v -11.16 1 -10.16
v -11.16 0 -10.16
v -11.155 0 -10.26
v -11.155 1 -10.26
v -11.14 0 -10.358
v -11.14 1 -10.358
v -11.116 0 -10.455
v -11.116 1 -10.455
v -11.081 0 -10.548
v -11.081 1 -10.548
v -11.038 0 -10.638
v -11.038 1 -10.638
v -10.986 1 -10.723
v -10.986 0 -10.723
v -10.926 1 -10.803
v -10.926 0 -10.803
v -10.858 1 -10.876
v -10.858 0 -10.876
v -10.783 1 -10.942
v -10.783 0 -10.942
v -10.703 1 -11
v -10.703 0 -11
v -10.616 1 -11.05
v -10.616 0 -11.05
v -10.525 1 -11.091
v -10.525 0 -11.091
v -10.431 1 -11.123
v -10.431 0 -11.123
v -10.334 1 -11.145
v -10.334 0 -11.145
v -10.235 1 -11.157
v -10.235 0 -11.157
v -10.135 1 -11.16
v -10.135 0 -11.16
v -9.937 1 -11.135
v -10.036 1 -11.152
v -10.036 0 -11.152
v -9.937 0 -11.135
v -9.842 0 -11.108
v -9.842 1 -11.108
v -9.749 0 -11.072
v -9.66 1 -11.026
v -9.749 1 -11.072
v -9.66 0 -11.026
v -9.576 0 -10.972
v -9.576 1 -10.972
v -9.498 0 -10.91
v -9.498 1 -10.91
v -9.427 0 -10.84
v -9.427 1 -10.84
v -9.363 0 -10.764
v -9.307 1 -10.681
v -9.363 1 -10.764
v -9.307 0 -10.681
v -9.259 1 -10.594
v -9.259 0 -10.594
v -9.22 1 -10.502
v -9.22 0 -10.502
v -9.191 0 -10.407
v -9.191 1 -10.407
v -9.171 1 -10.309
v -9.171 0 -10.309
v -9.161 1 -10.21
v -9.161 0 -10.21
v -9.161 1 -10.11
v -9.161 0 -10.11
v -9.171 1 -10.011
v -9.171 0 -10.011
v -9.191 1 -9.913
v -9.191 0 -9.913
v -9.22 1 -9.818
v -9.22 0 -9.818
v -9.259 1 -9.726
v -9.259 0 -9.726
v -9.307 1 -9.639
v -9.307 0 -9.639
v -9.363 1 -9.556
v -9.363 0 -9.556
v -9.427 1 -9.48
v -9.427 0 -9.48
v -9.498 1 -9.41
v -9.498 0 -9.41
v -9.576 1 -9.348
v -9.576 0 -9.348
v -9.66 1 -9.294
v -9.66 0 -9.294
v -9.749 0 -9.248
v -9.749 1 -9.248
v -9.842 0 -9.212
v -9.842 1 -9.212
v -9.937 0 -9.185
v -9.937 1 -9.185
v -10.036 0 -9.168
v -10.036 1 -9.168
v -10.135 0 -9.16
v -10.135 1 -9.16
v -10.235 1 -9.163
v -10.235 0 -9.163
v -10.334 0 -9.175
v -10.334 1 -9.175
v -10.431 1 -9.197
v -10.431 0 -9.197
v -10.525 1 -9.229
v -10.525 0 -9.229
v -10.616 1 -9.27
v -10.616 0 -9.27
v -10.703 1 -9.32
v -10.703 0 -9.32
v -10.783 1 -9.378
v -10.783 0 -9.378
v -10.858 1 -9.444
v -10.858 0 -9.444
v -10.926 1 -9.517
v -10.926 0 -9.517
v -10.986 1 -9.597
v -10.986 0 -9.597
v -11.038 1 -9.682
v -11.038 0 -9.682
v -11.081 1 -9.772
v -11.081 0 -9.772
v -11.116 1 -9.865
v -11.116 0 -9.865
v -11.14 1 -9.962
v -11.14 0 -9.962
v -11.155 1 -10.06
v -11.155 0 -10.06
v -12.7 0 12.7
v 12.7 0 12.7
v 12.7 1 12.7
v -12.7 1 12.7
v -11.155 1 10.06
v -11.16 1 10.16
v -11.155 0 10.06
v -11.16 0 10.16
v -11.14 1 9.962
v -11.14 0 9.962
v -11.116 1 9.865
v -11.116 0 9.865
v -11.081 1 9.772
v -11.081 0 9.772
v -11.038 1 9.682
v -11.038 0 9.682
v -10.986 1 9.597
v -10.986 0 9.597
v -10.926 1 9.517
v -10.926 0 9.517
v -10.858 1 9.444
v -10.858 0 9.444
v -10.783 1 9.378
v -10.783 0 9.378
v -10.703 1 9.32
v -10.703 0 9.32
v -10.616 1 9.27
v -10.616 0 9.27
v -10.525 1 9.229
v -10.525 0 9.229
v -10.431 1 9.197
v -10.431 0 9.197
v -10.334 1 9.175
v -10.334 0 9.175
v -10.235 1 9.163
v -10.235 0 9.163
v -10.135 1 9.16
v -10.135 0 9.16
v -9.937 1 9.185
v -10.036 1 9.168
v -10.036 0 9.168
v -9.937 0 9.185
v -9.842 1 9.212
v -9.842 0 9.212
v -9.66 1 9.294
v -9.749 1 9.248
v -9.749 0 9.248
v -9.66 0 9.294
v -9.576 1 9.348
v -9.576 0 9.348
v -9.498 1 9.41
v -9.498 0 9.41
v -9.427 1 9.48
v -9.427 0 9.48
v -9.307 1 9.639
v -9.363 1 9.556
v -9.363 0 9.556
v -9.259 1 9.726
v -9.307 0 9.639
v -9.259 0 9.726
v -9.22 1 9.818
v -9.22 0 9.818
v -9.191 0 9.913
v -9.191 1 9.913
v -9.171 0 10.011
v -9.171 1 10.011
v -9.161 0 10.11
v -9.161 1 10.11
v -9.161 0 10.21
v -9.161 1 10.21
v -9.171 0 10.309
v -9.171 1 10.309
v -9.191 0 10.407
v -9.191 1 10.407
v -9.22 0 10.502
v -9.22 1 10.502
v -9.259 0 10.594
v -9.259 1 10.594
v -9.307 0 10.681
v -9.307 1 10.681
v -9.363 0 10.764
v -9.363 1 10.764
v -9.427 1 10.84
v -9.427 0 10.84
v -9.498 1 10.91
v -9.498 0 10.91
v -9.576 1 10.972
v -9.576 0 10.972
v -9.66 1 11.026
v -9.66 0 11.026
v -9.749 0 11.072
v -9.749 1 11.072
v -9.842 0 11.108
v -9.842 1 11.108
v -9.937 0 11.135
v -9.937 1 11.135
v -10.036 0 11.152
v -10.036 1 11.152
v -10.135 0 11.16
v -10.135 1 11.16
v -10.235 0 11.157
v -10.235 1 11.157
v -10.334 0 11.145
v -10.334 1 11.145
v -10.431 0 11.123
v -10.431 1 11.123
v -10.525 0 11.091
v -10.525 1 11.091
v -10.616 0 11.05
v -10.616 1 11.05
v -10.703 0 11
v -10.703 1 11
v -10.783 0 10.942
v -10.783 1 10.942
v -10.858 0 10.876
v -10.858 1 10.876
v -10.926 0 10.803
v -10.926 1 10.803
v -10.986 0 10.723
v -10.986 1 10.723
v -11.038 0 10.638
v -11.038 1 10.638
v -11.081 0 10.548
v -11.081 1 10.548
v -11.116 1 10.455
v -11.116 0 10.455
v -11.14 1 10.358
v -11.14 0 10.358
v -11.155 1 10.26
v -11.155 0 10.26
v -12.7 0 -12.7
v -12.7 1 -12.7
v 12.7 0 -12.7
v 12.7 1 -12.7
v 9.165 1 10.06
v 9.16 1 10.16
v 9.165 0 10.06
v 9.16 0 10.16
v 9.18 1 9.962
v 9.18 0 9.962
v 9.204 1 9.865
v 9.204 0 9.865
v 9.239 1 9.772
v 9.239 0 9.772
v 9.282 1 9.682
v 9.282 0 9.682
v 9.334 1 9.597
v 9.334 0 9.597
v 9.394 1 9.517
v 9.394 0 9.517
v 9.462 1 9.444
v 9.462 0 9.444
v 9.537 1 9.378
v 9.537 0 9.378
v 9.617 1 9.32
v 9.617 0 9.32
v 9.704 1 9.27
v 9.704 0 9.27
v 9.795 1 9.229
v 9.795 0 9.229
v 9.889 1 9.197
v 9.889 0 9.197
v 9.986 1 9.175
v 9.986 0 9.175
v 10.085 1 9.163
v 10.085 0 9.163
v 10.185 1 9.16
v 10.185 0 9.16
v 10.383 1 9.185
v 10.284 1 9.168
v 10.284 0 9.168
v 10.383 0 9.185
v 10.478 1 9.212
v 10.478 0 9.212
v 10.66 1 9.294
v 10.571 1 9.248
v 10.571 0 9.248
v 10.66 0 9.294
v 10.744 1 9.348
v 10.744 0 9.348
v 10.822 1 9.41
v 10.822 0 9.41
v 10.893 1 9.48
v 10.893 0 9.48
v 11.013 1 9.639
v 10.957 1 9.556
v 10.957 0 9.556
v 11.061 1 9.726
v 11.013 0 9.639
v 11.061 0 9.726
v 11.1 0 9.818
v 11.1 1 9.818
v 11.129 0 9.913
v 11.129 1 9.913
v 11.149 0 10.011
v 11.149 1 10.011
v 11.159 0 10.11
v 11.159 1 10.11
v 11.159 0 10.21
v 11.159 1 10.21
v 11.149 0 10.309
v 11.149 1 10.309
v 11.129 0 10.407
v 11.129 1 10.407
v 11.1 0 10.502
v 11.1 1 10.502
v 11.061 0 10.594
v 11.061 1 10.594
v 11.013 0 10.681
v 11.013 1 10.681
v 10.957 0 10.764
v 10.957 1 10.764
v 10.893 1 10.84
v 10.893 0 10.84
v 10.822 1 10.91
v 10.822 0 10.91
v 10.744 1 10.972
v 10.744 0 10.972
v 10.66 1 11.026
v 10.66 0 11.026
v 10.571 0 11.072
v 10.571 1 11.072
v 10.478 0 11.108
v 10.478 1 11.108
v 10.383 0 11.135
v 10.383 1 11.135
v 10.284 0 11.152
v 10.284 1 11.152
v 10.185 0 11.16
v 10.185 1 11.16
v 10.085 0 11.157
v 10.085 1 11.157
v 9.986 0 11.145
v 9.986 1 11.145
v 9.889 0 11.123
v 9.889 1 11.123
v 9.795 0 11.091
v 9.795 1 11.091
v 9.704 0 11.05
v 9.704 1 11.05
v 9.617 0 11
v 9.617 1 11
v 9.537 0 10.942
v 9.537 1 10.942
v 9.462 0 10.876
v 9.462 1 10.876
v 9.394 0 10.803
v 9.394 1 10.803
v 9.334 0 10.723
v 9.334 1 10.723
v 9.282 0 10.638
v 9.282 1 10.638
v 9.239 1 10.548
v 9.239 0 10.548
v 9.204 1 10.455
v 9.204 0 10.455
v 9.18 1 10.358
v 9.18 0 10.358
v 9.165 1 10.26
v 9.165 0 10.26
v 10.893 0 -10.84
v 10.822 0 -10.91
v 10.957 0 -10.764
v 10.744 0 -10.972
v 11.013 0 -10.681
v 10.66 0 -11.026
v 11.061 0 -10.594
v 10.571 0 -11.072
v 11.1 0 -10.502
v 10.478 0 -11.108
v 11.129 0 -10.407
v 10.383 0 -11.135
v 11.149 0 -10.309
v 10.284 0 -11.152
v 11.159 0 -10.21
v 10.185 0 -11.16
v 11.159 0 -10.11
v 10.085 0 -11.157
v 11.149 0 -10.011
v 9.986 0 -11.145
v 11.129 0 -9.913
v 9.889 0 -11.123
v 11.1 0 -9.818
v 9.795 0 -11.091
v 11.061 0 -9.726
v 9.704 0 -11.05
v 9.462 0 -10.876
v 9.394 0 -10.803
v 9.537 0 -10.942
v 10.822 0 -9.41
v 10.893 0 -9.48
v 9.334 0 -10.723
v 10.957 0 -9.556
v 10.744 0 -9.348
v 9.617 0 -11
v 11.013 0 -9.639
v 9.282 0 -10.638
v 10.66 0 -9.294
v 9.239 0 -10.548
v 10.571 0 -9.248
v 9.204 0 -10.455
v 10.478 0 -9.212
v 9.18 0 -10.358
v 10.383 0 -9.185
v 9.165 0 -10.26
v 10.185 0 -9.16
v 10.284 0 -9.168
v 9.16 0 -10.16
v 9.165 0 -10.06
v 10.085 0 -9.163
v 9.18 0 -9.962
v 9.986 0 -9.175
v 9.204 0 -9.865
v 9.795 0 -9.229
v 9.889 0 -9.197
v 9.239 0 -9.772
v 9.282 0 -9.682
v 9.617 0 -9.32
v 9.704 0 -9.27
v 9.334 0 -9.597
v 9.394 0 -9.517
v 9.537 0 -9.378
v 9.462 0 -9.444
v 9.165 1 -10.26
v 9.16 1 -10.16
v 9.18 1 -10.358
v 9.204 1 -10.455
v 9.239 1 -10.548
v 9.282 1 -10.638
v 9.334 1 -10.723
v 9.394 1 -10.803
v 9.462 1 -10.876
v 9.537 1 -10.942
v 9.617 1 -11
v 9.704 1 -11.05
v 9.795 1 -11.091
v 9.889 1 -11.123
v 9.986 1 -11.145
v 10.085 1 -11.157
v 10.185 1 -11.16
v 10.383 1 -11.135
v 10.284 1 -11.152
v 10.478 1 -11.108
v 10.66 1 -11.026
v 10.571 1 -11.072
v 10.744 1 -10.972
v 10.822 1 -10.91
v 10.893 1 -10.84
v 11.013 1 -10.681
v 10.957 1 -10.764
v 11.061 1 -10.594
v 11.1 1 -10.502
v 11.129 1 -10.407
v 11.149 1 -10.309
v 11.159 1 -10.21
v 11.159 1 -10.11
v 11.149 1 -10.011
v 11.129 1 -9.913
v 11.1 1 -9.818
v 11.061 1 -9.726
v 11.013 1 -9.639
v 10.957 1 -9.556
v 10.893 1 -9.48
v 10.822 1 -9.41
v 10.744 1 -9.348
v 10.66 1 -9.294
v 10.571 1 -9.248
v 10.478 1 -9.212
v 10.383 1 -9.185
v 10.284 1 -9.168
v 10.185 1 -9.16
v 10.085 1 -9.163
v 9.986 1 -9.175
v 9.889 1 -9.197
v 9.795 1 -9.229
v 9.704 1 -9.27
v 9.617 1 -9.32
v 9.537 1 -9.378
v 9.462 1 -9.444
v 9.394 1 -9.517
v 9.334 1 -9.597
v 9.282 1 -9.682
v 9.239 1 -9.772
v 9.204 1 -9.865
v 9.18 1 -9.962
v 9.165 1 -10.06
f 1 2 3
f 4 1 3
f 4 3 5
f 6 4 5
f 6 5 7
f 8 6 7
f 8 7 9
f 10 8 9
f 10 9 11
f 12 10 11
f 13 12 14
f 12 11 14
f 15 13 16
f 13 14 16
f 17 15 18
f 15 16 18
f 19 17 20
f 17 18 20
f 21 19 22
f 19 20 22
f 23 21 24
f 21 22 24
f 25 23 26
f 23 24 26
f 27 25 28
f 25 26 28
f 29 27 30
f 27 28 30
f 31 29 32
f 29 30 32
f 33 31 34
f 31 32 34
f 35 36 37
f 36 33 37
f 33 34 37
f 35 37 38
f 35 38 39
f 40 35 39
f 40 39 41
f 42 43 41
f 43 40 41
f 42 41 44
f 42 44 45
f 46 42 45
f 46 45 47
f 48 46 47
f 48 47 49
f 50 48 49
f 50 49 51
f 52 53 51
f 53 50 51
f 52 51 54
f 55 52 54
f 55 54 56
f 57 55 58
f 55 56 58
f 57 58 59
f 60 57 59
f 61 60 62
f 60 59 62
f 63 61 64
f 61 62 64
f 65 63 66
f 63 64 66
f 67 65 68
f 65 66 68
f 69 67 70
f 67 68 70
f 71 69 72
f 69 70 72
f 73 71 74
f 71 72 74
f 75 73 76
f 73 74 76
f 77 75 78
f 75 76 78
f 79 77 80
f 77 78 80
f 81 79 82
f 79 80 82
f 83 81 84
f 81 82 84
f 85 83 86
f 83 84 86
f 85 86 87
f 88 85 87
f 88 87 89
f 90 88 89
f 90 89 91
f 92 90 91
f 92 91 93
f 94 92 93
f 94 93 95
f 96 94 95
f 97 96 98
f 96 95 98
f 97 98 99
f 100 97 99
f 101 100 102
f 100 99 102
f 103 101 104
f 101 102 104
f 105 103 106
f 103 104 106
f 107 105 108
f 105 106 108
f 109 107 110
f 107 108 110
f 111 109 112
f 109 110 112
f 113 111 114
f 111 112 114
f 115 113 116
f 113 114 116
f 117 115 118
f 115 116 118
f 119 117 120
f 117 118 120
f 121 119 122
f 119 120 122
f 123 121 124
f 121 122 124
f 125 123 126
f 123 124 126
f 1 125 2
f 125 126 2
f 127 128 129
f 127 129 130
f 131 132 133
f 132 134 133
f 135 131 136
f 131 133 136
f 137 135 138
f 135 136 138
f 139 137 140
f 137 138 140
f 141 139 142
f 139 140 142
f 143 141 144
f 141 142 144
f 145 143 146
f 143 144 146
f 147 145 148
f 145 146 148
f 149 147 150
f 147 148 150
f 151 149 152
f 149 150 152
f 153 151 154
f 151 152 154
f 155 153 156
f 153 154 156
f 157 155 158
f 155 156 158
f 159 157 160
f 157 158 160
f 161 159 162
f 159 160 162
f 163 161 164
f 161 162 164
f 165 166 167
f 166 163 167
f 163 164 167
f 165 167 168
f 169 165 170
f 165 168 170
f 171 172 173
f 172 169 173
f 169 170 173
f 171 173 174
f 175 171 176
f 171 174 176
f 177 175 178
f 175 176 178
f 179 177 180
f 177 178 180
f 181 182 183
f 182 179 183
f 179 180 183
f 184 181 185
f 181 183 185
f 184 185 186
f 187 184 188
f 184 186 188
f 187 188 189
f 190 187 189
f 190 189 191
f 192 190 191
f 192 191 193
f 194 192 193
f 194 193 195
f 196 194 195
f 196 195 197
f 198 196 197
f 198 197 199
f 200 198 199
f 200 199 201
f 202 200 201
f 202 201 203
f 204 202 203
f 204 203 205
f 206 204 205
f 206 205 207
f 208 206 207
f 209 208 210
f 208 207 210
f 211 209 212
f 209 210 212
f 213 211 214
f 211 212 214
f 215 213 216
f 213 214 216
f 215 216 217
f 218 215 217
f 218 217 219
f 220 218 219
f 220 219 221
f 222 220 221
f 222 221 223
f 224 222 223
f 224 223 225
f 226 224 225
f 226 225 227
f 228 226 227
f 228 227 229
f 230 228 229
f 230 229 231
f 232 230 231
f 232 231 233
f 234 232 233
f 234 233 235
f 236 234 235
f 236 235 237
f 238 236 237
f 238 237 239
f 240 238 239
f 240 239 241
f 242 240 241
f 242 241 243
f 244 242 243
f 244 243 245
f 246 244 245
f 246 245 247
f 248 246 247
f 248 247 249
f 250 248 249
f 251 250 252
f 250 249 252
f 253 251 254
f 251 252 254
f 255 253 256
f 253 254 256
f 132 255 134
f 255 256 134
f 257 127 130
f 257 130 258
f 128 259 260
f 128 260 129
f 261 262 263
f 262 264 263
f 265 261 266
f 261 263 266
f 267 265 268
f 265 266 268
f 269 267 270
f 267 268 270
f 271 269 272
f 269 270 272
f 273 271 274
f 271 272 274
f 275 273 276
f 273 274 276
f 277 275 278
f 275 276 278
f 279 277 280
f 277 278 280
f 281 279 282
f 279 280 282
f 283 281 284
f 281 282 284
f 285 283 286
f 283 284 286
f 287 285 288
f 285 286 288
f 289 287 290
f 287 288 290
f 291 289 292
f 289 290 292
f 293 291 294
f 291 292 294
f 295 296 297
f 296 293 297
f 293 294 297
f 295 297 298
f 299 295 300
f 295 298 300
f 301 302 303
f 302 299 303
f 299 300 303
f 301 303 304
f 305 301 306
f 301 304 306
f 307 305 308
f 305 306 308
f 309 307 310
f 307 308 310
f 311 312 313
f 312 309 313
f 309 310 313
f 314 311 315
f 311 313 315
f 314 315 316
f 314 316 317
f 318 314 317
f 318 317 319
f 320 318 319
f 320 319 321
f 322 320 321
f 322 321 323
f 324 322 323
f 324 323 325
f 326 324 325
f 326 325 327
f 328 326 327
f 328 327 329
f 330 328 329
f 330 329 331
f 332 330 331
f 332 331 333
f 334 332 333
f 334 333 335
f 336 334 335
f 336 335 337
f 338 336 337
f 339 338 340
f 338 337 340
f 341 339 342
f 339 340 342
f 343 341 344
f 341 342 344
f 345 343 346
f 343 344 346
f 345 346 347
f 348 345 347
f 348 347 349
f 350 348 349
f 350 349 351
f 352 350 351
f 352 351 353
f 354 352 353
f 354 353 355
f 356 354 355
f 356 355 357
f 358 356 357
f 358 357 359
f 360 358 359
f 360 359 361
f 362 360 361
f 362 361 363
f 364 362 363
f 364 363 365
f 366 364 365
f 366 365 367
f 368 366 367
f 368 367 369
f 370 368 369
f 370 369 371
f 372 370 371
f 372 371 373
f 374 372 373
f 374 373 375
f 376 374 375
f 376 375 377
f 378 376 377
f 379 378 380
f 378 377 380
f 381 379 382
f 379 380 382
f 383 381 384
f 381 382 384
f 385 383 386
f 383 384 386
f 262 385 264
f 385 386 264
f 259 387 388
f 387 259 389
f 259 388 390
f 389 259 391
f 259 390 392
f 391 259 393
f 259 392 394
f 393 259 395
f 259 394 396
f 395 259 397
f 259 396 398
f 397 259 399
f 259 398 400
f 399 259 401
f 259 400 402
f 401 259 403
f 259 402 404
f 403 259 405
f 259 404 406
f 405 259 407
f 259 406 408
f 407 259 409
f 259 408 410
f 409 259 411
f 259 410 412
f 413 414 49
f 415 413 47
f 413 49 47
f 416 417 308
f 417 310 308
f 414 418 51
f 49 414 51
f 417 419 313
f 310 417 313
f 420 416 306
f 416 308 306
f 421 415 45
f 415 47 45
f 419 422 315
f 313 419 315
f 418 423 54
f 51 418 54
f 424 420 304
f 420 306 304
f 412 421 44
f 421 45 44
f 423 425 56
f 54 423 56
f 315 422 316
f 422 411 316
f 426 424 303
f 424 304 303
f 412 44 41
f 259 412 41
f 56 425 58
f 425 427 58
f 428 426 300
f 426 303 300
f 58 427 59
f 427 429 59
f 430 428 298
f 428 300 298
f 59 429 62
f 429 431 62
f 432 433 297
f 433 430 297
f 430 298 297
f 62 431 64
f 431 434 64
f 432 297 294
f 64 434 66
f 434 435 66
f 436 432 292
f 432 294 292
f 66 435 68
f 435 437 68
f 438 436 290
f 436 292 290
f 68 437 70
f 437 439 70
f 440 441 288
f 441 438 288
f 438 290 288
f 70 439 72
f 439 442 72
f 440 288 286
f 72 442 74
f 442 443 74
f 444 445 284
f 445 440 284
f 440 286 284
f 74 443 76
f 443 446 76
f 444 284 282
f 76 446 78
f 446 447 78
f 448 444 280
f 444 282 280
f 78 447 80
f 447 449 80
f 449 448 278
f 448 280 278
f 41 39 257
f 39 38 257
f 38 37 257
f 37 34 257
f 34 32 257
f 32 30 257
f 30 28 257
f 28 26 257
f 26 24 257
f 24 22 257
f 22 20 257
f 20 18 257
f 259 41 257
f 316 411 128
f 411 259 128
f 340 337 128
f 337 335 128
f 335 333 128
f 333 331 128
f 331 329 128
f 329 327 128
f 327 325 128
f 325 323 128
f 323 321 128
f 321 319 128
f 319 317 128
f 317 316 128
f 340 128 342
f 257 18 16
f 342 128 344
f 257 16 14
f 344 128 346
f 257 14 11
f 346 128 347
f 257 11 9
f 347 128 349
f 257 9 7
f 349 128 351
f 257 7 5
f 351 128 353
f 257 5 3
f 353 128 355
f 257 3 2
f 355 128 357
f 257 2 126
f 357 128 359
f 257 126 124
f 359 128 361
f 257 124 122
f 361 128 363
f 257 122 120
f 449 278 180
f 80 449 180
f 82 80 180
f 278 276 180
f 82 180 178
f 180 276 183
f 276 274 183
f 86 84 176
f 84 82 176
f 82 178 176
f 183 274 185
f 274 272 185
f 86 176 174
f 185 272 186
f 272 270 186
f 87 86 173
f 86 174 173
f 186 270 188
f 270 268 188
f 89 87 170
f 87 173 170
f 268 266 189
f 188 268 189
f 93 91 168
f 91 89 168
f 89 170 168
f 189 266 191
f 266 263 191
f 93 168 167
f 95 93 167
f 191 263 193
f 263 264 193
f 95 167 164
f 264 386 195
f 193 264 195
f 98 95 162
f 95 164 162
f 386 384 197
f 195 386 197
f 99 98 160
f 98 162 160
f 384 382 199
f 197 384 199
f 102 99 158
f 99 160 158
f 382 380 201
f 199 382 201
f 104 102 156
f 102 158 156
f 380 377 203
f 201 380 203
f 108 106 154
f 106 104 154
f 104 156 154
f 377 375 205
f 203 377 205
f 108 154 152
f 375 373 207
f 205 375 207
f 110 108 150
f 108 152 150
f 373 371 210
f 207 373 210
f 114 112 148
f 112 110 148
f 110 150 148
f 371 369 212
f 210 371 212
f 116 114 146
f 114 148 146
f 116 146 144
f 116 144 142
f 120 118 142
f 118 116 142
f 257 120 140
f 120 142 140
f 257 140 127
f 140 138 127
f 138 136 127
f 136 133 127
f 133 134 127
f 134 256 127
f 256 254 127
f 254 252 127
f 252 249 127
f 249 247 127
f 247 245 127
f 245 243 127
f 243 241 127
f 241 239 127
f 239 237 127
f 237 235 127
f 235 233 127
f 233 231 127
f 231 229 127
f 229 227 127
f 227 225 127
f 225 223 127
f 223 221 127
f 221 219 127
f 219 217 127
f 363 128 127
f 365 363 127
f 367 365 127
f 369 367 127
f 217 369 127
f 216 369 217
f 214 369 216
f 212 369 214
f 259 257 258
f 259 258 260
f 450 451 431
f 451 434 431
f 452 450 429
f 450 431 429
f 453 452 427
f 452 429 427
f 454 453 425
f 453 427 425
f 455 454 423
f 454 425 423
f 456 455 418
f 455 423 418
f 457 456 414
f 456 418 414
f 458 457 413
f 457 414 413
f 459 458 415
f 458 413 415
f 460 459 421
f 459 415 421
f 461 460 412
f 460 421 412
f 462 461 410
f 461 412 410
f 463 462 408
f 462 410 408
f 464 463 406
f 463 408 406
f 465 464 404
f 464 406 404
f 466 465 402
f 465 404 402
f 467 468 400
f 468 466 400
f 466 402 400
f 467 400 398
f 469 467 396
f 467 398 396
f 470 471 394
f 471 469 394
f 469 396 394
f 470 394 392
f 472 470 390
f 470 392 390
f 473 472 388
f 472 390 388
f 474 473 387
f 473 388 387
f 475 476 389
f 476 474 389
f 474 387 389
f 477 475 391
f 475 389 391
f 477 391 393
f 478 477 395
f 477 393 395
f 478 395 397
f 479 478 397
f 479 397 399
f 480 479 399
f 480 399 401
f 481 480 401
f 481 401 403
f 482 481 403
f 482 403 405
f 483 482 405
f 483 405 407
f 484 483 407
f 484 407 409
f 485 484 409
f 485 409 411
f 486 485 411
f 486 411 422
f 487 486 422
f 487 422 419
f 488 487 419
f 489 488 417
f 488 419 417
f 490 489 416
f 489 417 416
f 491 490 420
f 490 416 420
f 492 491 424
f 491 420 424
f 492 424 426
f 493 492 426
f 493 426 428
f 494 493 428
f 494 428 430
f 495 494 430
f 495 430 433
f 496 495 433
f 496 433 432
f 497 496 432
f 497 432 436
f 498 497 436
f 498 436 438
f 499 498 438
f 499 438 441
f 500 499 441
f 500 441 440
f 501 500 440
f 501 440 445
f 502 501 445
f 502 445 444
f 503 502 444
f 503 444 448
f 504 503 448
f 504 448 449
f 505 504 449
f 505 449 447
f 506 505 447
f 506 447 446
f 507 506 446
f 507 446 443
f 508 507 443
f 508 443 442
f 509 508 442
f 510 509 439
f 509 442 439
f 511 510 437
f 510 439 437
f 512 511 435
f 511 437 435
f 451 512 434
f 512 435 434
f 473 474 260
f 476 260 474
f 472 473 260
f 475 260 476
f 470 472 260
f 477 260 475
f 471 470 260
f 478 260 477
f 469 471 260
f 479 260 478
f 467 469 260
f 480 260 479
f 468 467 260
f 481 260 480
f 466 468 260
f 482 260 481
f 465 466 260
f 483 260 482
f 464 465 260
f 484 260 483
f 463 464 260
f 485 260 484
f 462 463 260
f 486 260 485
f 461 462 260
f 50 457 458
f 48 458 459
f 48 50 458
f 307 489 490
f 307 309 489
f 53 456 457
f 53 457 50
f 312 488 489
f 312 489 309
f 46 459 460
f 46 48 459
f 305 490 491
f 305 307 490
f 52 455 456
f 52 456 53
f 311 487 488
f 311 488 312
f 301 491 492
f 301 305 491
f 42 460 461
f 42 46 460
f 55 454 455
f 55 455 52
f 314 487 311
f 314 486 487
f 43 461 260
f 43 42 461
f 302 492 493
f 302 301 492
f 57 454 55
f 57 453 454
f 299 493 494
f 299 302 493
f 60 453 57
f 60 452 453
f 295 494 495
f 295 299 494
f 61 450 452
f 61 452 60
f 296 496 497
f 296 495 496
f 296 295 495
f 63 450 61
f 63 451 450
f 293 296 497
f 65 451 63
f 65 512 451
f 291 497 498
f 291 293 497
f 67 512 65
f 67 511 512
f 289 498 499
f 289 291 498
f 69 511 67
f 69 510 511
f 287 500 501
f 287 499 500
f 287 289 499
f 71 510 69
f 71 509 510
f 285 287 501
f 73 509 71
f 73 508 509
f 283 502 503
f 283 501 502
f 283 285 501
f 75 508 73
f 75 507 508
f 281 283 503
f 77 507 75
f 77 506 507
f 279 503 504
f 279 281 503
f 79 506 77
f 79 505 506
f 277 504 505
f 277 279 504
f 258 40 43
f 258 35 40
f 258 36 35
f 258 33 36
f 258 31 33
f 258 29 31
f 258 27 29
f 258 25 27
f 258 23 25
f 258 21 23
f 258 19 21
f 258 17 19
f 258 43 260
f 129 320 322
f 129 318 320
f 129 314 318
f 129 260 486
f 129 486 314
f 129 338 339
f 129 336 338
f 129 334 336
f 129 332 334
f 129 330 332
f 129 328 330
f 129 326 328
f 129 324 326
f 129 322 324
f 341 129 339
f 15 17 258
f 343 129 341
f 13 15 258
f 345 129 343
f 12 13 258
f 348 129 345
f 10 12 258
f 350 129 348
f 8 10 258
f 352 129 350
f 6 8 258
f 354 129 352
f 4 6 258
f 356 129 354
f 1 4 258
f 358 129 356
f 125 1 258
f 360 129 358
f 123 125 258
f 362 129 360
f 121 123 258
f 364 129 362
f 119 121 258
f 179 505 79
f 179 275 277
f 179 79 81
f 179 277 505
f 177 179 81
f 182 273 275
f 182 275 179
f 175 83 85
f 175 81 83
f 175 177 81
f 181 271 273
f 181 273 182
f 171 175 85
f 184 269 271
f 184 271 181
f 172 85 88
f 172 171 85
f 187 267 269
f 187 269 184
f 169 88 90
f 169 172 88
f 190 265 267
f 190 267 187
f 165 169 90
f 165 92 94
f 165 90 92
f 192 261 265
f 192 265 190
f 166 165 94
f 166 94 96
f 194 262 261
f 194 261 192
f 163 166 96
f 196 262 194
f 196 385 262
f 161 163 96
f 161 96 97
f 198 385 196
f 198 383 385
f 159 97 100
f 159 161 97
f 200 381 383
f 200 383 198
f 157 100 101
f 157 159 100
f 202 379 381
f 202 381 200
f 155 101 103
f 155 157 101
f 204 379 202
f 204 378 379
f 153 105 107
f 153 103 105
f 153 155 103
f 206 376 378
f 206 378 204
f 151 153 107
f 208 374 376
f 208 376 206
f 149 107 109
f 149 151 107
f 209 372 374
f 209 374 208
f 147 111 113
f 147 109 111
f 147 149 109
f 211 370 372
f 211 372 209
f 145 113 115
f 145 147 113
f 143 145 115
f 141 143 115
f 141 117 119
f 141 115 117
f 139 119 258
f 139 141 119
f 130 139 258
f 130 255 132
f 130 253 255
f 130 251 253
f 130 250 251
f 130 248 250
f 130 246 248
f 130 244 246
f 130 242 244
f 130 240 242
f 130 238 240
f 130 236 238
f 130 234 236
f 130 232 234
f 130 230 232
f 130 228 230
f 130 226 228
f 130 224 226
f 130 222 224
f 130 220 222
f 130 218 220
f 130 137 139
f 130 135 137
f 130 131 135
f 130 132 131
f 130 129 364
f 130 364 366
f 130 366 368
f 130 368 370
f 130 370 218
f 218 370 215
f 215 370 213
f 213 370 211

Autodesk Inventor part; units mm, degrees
ref_plane "YZ Plane" through (0, 0, 0) normal (1, 0, 0) x (0, 1, 0)
ref_plane "XZ Plane" through (0, 0, 0) normal (0, 1, 0) x (-1, 0, 0)
ref_plane "XY Plane" through (0, 0, 0) normal (0, 0, 1) x (1, 0, 0)
sketch "Sketch1" plane through (0, 0, 0) normal (0, 1, 0) x (-1, 0, 0)
  line L0 (-12.7, 12.7) -> (12.7, 12.7)
  line L1 (12.7, 12.7) -> (12.7, -12.7)
  line L2 (12.7, -12.7) -> (-12.7, -12.7)
  line L3 (-12.7, -12.7) -> (-12.7, 12.7)
  line L4 (-12.7, 12.7) -> (12.7, -12.7) construction
  line L5 (12.7, 12.7) -> (-12.7, -12.7) construction
  circle A0 centre (10.16, 10.16) radius 1
  line L6 (0, 15.3102) -> (0, -24.4188) construction
  line L7 (16, 0) -> (-15.6009, 0) construction
  circle A1 centre (10.16, -10.16) radius 1
  circle A2 centre (-10.16, 10.16) radius 1
  circle A3 centre (-10.16, -10.16) radius 1
  point P0 (0, 0)
  dimension "d0" = 25.4
  dimension "d1" = 25.4
  dimension "d2" = 2.54
  dimension "d3" = 2.54
extrude "Extrusion1" add sketch "Sketch1" along normal blind 1
properties part number "step_down_Suba"
